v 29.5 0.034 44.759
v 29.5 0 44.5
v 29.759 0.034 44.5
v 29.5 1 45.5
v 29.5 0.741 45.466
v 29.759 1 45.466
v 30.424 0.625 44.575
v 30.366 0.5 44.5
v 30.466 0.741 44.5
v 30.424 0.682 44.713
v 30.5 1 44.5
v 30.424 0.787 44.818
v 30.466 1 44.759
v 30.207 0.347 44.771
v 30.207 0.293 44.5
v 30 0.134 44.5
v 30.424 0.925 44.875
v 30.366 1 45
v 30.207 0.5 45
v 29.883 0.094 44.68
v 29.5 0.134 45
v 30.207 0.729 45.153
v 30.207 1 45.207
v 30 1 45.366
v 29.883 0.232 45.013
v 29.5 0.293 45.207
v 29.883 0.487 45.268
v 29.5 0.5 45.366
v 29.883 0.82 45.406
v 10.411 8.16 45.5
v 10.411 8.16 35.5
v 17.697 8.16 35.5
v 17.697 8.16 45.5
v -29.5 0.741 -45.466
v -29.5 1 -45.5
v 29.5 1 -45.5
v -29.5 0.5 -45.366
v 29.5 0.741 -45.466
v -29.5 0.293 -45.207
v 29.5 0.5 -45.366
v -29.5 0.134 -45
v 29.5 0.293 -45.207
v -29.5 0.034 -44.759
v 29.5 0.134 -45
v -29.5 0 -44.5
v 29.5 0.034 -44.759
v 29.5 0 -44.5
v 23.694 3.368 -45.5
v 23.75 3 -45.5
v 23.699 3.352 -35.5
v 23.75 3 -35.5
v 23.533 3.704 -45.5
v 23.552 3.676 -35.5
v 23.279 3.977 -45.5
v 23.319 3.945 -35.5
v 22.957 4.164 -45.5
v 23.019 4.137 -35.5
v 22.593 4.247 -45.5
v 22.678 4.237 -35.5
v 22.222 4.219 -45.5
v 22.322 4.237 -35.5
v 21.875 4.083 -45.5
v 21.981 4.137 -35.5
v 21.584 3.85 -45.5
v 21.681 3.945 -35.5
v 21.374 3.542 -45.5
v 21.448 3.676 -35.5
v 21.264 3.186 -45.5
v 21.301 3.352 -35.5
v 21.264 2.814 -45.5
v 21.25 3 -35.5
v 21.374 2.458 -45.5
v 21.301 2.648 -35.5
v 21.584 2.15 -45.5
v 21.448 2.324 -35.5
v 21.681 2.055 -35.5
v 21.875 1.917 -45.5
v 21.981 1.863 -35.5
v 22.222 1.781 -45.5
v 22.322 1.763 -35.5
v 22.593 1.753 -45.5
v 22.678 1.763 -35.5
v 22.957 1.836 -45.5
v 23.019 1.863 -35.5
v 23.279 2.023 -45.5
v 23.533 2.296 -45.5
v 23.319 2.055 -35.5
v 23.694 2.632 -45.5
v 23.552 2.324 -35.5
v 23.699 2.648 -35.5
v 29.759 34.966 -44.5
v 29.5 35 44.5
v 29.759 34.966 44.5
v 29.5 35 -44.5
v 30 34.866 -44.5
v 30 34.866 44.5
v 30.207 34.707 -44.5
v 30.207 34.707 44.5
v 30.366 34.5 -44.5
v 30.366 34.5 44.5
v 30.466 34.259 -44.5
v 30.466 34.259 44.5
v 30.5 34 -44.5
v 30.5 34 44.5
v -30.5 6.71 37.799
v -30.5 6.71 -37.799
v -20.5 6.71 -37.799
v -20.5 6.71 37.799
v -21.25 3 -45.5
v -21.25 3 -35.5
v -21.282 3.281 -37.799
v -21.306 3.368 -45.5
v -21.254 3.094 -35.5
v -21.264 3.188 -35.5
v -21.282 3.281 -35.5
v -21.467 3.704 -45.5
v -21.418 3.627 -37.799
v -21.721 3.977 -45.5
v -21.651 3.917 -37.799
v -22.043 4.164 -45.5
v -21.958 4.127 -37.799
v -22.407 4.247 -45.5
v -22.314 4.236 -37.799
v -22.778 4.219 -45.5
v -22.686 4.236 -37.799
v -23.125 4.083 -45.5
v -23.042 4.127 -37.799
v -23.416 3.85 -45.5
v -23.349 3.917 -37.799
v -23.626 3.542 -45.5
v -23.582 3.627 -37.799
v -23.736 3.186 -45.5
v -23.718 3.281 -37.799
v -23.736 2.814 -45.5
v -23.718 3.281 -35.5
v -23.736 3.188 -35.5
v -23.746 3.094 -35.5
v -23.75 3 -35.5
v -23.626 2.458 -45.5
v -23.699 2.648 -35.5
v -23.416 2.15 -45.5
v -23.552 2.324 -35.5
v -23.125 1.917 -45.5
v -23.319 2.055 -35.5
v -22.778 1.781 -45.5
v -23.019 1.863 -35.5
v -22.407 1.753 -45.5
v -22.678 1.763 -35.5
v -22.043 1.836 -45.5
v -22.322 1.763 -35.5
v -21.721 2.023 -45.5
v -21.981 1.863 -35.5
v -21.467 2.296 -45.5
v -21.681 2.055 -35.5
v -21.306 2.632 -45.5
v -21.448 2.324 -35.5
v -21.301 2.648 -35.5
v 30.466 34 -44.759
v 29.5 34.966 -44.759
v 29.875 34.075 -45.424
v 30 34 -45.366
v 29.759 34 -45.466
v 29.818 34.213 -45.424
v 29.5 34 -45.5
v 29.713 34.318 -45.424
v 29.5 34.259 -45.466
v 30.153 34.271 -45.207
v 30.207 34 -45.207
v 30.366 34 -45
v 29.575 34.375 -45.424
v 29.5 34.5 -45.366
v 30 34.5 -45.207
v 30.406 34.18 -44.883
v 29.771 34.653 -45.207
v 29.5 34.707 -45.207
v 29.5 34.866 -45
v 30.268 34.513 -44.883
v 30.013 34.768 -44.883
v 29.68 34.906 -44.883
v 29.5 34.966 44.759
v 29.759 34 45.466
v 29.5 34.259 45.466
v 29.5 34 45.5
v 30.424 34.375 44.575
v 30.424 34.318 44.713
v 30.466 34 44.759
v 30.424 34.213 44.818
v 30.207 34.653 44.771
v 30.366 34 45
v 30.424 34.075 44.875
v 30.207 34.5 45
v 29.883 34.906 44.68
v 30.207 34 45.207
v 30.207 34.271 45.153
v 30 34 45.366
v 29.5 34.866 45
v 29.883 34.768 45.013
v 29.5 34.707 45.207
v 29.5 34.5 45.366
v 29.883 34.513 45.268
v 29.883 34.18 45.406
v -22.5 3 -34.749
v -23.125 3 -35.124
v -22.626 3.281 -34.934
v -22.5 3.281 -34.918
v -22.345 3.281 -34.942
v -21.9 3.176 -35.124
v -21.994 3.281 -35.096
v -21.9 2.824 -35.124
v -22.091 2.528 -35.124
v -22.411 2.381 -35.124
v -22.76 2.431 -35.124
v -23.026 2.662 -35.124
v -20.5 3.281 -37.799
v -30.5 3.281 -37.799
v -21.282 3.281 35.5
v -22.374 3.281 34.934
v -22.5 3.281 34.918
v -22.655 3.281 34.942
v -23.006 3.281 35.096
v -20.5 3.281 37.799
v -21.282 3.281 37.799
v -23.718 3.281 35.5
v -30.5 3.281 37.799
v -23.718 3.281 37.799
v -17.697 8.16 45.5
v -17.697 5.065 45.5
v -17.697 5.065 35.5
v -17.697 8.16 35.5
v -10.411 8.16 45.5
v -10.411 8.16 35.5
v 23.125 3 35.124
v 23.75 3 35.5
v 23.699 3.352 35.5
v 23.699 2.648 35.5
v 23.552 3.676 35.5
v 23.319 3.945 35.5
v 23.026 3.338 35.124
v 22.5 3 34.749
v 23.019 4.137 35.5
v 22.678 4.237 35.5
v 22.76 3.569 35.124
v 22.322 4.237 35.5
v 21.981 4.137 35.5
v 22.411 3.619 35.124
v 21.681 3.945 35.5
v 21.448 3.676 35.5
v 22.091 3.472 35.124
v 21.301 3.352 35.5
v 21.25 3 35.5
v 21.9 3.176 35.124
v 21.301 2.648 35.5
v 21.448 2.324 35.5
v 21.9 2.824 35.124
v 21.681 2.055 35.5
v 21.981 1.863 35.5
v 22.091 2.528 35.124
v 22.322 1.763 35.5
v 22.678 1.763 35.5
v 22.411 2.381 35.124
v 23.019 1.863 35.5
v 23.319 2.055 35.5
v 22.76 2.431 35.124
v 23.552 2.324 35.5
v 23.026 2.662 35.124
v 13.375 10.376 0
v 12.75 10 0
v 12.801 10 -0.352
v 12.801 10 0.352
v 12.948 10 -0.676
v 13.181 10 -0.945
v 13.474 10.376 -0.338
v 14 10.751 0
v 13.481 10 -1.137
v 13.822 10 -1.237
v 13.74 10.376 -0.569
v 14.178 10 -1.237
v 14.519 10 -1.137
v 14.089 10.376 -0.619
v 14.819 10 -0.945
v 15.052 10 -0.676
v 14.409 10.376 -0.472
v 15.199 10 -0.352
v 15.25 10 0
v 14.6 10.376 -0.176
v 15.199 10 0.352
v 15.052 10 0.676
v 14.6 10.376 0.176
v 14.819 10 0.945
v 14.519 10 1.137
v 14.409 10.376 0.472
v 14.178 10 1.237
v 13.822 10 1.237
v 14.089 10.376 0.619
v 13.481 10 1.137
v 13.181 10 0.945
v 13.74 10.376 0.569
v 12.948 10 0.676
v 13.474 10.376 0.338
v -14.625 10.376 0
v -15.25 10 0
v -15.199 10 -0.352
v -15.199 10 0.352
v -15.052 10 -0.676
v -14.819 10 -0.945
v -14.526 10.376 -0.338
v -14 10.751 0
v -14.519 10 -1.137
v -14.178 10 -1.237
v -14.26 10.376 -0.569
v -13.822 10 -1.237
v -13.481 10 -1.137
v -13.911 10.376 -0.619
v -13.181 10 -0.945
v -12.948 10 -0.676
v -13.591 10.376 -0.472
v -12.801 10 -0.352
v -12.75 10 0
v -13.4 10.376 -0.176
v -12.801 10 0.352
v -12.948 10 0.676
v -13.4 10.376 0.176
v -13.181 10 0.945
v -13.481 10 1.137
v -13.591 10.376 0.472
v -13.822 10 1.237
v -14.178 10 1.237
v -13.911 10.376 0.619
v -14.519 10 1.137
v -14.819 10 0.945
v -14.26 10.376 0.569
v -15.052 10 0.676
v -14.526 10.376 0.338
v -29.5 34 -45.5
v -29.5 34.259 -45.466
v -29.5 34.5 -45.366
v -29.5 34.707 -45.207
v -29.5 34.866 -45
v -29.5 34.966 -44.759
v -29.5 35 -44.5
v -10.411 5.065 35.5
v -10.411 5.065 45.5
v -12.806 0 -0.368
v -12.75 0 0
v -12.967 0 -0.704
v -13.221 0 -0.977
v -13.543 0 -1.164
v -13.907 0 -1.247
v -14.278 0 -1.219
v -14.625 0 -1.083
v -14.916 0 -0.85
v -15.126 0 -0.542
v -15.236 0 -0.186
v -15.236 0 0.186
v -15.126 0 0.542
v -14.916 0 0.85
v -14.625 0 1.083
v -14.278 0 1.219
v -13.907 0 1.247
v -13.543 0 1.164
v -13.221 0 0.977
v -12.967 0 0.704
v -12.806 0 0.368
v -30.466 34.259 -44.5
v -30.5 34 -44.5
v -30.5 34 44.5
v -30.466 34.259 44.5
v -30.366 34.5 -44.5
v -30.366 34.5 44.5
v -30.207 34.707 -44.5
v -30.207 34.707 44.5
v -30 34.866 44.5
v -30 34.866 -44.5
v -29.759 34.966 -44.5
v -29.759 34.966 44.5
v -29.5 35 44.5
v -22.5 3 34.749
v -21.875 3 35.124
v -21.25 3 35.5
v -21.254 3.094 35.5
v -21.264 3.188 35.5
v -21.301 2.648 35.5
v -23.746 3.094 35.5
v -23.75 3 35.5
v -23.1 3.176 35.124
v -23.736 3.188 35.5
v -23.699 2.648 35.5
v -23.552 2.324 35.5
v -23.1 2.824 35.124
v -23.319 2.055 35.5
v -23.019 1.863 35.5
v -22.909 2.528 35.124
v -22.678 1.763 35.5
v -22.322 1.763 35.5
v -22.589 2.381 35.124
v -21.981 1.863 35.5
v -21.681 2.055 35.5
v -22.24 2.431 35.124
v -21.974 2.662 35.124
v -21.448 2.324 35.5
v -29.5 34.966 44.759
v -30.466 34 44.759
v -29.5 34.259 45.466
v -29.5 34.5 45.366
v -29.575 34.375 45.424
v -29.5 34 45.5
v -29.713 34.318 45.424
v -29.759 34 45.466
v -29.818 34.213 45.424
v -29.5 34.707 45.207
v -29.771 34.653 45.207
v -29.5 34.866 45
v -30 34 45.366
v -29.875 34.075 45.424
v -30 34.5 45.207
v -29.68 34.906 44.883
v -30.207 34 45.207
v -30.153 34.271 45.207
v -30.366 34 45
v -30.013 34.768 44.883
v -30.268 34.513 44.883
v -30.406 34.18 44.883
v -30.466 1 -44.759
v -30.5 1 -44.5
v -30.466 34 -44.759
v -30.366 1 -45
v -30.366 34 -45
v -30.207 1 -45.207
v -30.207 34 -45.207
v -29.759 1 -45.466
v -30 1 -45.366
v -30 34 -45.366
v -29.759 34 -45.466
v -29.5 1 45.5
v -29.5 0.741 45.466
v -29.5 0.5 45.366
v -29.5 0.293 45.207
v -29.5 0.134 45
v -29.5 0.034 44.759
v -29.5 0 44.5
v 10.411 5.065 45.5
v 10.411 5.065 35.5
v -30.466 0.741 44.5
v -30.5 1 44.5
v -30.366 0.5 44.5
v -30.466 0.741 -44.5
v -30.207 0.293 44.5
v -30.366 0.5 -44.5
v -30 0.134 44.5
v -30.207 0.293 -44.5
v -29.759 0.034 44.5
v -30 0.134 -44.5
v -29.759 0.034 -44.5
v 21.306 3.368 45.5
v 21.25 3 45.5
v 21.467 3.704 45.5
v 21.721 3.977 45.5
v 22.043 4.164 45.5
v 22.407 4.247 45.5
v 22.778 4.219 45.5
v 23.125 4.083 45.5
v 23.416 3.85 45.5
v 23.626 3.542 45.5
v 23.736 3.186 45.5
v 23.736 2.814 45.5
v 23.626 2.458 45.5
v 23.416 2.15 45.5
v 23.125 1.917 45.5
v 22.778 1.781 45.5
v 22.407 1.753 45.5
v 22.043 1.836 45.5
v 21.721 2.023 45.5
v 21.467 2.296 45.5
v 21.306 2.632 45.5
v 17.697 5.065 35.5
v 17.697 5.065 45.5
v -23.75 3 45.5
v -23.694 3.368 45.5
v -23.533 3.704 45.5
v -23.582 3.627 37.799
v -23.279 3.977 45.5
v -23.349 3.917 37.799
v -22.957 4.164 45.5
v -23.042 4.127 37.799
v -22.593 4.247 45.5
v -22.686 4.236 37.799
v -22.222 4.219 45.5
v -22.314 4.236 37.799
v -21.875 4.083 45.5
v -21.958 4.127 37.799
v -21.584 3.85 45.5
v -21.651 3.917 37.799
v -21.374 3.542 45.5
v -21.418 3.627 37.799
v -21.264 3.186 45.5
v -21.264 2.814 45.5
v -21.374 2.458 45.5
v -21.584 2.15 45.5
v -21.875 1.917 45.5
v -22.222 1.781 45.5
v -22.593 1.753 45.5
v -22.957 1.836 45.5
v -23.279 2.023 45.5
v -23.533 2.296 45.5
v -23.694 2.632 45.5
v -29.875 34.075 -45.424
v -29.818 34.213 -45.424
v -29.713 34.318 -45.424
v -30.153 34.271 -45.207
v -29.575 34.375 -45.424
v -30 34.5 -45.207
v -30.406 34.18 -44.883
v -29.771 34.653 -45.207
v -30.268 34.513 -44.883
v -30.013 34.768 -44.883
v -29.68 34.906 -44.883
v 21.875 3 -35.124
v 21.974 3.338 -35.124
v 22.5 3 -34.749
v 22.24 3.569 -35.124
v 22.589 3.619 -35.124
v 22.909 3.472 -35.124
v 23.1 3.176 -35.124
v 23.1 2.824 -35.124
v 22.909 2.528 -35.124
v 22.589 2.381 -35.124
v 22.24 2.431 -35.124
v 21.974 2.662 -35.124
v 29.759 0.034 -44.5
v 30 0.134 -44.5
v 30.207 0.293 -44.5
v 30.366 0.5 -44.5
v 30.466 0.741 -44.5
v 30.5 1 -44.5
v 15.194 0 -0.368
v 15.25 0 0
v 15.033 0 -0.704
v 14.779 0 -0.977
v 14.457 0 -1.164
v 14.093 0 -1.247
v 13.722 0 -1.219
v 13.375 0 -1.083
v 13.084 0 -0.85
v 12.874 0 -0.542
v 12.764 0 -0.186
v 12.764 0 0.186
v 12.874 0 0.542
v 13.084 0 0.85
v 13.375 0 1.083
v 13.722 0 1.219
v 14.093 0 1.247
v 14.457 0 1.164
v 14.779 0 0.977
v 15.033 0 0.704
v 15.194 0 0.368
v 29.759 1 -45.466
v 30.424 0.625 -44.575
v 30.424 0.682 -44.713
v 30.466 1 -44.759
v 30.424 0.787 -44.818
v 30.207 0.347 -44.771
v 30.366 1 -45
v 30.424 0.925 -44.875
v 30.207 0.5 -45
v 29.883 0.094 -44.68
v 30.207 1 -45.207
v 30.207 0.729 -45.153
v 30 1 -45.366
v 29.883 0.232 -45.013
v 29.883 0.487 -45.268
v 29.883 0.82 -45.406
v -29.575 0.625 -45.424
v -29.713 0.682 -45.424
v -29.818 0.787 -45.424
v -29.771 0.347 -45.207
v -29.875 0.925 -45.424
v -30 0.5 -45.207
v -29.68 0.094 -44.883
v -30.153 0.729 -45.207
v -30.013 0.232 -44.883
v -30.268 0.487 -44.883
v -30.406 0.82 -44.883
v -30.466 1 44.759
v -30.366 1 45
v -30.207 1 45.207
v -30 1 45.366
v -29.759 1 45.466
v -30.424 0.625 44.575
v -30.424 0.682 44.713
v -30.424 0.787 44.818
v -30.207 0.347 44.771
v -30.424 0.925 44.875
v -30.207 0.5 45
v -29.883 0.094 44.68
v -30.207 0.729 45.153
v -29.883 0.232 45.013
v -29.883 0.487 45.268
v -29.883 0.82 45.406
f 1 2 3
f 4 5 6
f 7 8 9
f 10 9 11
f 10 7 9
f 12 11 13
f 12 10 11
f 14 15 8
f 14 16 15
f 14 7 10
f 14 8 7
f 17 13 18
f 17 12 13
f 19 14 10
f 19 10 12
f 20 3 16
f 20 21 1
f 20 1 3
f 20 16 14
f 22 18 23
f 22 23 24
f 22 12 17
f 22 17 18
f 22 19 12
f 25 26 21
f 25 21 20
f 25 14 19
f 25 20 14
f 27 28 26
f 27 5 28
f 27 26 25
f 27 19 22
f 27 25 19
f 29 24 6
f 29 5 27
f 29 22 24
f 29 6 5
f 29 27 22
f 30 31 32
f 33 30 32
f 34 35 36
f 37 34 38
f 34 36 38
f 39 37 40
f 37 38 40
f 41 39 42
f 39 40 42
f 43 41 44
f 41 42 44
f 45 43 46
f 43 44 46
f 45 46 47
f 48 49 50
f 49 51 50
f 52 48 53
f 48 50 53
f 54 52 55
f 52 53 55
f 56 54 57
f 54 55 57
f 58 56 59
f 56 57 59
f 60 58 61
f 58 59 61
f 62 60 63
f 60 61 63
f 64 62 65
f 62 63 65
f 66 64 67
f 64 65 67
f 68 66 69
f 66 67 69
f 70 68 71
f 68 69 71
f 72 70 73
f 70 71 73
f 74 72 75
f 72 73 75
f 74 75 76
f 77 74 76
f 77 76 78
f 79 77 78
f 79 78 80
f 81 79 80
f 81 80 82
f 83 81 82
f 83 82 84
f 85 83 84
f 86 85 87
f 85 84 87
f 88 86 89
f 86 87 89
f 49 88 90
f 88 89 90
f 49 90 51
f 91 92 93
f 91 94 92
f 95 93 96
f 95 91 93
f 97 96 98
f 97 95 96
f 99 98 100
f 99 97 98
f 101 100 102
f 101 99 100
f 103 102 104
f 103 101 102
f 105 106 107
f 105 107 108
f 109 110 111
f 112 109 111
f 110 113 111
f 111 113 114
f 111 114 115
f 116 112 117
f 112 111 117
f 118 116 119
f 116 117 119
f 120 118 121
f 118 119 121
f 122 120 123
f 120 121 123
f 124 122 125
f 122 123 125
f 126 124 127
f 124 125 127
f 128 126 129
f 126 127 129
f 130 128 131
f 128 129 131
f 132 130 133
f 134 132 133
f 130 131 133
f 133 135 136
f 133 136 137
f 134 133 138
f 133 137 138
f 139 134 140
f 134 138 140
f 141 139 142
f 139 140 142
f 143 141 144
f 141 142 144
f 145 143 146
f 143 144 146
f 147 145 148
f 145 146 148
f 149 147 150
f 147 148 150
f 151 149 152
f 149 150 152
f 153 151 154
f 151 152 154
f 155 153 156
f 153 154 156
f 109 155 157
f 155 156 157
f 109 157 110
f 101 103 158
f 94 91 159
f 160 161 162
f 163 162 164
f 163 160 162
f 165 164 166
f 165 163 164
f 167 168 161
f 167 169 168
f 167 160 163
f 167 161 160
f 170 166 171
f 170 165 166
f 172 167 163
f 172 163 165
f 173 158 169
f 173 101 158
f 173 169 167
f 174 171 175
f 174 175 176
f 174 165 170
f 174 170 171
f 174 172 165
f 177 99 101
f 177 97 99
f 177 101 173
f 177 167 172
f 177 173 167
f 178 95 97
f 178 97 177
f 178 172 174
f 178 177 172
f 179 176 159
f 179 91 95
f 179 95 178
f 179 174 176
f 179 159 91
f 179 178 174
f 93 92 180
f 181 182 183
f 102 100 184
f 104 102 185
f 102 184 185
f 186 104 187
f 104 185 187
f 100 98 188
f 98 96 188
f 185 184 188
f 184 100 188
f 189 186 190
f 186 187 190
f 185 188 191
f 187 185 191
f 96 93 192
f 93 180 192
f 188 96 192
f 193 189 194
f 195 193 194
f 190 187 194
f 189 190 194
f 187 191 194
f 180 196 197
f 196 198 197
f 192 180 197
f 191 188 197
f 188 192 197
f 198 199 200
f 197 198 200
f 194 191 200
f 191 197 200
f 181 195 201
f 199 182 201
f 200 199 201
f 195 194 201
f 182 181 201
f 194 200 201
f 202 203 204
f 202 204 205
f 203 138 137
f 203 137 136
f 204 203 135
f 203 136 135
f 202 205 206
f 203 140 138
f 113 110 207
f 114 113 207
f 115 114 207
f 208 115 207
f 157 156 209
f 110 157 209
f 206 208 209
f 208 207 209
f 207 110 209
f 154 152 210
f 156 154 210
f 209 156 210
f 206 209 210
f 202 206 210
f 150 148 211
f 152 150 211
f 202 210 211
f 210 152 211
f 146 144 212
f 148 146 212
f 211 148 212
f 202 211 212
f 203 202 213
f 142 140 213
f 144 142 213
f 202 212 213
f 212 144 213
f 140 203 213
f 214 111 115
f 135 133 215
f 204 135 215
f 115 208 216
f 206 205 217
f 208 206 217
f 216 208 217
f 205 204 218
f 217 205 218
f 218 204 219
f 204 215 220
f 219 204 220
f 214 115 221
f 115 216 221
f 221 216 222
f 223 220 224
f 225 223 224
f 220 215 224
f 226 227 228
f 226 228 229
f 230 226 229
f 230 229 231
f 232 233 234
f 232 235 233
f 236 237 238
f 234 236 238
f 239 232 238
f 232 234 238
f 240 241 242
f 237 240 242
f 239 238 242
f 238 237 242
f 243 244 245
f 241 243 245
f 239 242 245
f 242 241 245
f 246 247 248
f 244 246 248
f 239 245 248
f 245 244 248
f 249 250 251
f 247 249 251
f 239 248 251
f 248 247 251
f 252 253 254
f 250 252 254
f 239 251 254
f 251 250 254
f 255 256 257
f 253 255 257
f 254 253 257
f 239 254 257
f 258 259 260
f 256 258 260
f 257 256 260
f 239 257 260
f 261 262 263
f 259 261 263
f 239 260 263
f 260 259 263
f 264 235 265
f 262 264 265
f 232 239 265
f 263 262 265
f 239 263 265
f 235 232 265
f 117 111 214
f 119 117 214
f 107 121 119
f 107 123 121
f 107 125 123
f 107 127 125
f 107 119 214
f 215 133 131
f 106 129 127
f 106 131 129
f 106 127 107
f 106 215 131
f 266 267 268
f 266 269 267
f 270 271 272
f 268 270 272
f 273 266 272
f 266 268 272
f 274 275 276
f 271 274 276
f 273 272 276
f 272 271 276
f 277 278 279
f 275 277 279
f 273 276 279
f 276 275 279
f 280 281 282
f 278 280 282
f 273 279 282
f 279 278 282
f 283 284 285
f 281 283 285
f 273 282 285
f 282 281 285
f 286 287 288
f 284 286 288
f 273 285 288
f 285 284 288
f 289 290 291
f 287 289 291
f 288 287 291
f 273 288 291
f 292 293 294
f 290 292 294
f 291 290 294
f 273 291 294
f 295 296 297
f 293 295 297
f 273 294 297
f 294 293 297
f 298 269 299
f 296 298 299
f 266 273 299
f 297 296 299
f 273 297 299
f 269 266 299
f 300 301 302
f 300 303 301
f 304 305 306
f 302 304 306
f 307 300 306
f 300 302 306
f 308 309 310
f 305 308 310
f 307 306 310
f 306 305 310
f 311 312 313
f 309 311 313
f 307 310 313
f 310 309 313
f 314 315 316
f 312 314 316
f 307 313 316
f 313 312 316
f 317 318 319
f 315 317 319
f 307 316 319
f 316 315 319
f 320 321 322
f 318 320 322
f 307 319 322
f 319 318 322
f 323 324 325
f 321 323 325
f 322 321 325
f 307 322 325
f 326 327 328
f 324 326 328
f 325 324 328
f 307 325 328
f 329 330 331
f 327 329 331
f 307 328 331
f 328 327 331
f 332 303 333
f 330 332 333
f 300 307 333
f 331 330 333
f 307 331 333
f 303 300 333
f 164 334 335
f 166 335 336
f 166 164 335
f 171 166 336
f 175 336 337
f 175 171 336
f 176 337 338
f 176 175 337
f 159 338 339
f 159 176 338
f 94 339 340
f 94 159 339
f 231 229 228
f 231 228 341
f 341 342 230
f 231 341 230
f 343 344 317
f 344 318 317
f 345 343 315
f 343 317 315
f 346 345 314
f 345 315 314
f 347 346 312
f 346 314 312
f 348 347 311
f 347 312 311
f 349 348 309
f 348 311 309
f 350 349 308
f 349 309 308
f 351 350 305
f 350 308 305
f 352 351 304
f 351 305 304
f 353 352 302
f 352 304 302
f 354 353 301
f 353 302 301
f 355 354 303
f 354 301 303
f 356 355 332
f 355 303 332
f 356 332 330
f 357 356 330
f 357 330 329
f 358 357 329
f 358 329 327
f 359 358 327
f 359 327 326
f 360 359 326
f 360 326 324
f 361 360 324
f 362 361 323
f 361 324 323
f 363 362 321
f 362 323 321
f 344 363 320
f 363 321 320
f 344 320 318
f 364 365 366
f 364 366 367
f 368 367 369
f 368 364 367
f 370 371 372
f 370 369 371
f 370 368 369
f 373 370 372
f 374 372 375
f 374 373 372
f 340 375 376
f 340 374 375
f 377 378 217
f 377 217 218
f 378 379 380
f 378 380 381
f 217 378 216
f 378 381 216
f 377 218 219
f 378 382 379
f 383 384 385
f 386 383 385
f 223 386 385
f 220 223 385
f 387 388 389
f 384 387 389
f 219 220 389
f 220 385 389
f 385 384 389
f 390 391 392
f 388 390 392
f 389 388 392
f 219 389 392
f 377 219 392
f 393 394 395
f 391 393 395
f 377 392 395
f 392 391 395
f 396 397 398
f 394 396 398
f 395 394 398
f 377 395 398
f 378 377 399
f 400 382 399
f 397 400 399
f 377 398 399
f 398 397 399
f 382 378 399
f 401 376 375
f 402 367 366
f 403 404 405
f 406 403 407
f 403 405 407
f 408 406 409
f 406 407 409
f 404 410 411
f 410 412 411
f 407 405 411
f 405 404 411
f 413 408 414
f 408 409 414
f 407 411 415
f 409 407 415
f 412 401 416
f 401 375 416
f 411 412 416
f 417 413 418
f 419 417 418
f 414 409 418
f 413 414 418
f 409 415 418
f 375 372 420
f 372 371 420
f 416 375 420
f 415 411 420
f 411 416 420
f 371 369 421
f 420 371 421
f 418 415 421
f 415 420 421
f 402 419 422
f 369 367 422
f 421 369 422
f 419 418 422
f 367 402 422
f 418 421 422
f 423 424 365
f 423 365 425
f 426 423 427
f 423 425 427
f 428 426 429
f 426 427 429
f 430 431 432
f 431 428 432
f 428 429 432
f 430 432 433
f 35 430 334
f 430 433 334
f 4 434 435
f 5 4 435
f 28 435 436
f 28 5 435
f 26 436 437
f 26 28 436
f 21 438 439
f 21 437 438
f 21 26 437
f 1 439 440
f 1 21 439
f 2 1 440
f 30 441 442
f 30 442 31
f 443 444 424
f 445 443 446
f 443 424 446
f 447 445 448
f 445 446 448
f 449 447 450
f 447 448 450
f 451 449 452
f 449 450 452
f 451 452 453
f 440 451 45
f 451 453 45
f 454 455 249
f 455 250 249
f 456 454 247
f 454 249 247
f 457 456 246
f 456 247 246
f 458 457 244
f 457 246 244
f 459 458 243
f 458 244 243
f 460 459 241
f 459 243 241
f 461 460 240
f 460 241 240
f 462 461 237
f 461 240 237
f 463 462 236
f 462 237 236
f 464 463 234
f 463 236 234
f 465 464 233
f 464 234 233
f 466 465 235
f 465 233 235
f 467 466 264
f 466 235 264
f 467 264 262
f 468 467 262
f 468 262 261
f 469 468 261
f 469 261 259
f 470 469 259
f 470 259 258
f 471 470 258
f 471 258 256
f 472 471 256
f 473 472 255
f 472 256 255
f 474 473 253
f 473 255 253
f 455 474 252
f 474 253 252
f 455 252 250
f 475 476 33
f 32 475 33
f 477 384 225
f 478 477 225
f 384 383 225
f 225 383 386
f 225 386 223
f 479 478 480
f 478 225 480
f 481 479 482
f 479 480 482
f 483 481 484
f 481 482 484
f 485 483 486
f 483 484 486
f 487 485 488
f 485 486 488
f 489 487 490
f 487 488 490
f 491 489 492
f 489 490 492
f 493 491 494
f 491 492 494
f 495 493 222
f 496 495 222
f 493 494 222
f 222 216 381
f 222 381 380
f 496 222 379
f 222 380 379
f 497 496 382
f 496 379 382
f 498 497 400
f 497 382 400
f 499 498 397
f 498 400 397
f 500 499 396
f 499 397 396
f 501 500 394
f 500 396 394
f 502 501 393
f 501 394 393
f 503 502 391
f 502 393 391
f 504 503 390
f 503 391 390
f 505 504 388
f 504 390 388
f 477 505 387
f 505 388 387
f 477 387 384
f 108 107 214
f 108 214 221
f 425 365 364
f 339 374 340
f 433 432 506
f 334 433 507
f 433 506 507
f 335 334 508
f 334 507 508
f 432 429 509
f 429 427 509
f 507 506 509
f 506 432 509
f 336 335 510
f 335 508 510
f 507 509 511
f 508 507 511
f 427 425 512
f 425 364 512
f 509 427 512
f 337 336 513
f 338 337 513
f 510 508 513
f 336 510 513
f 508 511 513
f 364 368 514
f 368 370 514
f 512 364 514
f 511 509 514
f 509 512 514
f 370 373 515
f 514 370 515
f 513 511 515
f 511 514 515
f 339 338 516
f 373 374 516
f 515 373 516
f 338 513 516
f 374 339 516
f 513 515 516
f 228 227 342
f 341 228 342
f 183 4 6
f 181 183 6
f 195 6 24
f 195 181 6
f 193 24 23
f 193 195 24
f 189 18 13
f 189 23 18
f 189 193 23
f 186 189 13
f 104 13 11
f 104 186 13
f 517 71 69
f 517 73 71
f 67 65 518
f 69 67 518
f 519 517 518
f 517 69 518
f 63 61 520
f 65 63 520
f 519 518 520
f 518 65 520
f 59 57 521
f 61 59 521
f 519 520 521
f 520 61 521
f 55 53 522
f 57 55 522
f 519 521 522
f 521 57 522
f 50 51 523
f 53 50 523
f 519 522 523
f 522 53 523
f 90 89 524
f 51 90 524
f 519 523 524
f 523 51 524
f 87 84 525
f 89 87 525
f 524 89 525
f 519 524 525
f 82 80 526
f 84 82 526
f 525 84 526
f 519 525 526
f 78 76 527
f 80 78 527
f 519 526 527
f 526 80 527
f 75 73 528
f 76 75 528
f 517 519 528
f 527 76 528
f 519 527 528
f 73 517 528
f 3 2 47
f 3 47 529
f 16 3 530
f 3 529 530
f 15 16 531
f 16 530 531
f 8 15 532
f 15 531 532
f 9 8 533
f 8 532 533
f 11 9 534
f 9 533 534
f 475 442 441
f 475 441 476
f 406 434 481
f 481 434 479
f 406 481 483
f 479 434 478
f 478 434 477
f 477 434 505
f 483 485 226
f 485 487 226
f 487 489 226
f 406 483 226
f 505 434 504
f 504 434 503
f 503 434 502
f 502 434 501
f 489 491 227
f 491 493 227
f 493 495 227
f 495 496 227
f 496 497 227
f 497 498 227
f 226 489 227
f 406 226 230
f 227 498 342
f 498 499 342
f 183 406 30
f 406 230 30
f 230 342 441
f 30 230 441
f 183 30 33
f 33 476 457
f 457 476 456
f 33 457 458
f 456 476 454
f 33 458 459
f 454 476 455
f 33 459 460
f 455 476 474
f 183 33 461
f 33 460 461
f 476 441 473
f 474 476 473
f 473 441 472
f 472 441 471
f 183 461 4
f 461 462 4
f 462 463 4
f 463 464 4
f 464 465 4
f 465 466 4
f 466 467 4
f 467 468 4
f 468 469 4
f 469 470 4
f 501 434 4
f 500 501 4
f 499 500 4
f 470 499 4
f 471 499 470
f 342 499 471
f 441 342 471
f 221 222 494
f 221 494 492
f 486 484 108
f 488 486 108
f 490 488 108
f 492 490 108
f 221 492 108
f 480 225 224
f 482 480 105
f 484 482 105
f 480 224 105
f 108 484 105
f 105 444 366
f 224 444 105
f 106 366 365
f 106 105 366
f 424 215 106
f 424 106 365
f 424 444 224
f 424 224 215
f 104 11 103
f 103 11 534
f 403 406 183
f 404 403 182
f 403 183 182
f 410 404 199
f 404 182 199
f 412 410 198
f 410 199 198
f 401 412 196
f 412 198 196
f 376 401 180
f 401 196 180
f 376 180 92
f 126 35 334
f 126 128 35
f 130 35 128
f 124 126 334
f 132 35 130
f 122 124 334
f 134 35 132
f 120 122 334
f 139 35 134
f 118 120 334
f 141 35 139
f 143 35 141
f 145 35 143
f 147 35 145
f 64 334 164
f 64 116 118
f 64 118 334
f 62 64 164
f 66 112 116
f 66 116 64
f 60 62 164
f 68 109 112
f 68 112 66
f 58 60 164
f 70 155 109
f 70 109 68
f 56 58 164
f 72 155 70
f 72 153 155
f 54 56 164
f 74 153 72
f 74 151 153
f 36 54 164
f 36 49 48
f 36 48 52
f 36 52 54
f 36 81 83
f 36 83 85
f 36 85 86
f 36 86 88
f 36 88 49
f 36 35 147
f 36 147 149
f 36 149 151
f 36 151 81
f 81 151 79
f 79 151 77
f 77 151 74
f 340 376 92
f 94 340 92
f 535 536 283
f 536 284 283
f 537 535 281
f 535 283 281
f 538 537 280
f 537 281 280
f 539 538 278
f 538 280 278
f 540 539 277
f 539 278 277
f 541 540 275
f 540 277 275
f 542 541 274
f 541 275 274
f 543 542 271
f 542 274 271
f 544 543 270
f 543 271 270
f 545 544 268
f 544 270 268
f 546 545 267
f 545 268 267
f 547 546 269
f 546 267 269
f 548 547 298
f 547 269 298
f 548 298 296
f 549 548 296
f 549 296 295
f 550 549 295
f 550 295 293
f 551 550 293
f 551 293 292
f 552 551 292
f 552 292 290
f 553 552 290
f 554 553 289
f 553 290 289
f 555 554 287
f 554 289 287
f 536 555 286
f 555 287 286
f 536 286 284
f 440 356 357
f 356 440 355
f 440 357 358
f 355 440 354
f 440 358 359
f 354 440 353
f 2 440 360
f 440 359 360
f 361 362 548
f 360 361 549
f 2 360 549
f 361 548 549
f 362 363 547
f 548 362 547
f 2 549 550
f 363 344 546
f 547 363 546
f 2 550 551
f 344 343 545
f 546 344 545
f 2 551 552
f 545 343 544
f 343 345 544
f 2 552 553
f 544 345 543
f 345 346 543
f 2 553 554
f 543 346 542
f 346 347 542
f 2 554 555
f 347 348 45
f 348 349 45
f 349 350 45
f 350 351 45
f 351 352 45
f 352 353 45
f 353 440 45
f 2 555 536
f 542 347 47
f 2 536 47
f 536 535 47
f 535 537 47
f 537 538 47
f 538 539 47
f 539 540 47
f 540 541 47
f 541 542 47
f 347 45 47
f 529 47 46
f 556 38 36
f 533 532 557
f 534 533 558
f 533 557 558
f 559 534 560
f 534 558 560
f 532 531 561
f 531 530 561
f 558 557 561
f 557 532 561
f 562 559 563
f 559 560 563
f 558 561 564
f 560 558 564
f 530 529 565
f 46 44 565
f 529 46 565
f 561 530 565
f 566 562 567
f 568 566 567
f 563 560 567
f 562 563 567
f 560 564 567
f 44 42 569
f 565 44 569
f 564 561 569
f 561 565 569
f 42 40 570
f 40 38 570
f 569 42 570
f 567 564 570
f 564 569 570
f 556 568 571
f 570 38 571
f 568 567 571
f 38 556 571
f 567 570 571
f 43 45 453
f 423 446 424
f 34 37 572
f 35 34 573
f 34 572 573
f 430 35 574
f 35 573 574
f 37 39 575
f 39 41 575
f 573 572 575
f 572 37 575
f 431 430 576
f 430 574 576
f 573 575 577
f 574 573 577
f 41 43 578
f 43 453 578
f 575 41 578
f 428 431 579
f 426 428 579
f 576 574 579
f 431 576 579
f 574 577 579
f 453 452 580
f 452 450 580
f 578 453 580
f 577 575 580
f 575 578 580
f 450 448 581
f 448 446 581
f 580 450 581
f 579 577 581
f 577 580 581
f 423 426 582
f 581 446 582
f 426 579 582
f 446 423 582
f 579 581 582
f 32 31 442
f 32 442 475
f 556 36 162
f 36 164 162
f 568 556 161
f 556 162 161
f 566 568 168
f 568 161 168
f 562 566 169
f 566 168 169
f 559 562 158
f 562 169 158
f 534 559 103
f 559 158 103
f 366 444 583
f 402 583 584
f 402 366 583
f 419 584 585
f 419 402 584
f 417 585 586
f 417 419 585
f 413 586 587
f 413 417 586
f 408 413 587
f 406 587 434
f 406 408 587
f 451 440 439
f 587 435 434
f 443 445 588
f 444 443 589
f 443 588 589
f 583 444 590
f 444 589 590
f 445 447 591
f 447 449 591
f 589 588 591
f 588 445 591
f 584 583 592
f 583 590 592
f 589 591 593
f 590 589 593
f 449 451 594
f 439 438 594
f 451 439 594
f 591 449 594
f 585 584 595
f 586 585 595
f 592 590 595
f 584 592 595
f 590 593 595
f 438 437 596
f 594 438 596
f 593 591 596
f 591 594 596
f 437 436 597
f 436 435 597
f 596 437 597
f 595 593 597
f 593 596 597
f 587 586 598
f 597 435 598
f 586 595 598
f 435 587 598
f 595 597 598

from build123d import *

# Parameters (mm, degrees)
SKETCH_1_W             = 61
SKETCH_1_H             = 91
EXTRUDE_1_DEPTH        = 35
HOLE_WIZARD_M3_1_D     = 2.5
HOLE_WIZARD_M3_1_DEPTH = 10
HOLE_WIZARD_M3_1_TIP   = 0.751075774
M3X0_5_1_D             = 2.5
M3X0_5_1_DEPTH         = 10
M3X0_5_1_TIP           = 0.751075774
HOLE_WIZARD_M3_2_D     = 2.5
HOLE_WIZARD_M3_2_DEPTH = 10
HOLE_WIZARD_M3_2_TIP   = 0.751075774
FILLET_1_R             = 1
SKETCH_9_W             = 7.285769401
SKETCH_9_H             = 3.095672023
CUT_EXTRUDE_1_DEPTH    = 10
SKETCH_10_W            = 75.598284418
SKETCH_10_H            = 3.429789841
CUT_EXTRUDE_2_DEPTH    = 10


with BuildPart() as part:
    # 草图1 → 凸台-拉伸1 (new body)
    with BuildSketch(Plane(origin=(0, 0, 0), x_dir=(1, 0, 0), z_dir=(0, 1, 0))):
        Rectangle(SKETCH_1_W, SKETCH_1_H)
    extrude(amount=EXTRUDE_1_DEPTH)

    # M3 螺纹孔1
    with Locations(Plane(origin=(-22.5, 3, 45.5), x_dir=(1, 0, 0), z_dir=(0, 0, 1))):
        with Locations((0, 0), (45, 0)):
            Hole(HOLE_WIZARD_M3_1_D / 2, depth=HOLE_WIZARD_M3_1_DEPTH)
            with Locations((0, 0, -(HOLE_WIZARD_M3_1_DEPTH + HOLE_WIZARD_M3_1_TIP / 2))):  # 118° drill point
                Cone(0, HOLE_WIZARD_M3_1_D / 2, HOLE_WIZARD_M3_1_TIP, mode=Mode.SUBTRACT)

    # M3x0.5 螺纹孔1
    with Locations(Plane(origin=(0, 0, -45.5), x_dir=(-1, 0, 0), z_dir=(0, 0, -1))):
        with Locations((-22.5, 3), (22.5, 3)):
            Hole(M3X0_5_1_D / 2, depth=M3X0_5_1_DEPTH)
            with Locations((0, 0, -(M3X0_5_1_DEPTH + M3X0_5_1_TIP / 2))):  # 118° drill point
                Cone(0, M3X0_5_1_D / 2, M3X0_5_1_TIP, mode=Mode.SUBTRACT)

    # M3 螺纹孔2
    with Locations(Plane(origin=(0, 0, 0), x_dir=(-1, 0, 0), z_dir=(0, -1, 0))):
        with Locations((14, 0), (-14, 0)):
            Hole(HOLE_WIZARD_M3_2_D / 2, depth=HOLE_WIZARD_M3_2_DEPTH)
            with Locations((0, 0, -(HOLE_WIZARD_M3_2_DEPTH + HOLE_WIZARD_M3_2_TIP / 2))):  # 118° drill point
                Cone(0, HOLE_WIZARD_M3_2_D / 2, HOLE_WIZARD_M3_2_TIP, mode=Mode.SUBTRACT)

    # 圆角1
    fillet_1_edges = [part.edges().sort_by_distance(p)[0] for p in [
        (-30.5, 35, 0),
        (0, 35, 45.5),
        (30.5, 35, 0),
        (0, 0, 45.5),
        (-30.5, 0, 0),
        (0, 0, -45.5),
        (30.5, 0, 0),
        (30.5, 17.5, 45.5),
        (-30.5, 17.5, 45.5),
        (-30.5, 17.5, -45.5),
        (30.5, 17.5, -45.5),
        (0, 35, -45.5),
    ]]
    fillet(fillet_1_edges, radius=FILLET_1_R)

    # 草图9 → 切除-拉伸1 (cut)
    with BuildSketch(Plane.XY.offset(45.5)):
        with Locations((14.053983322, 6.612378958)):
            Rectangle(SKETCH_9_W, SKETCH_9_H)
        with Locations((-14.053983322, 6.612378958)):
            Rectangle(SKETCH_9_W, SKETCH_9_H)
    extrude(amount=-CUT_EXTRUDE_1_DEPTH, mode=Mode.SUBTRACT)

    # 草图10 → 切除-拉伸2 (cut)
    with BuildSketch(Plane.ZY.offset(30.5)):
        with Locations((0, 4.995557871)):
            Rectangle(SKETCH_10_W, SKETCH_10_H)
    extrude(amount=-CUT_EXTRUDE_2_DEPTH, mode=Mode.SUBTRACT)


solid = part.part
